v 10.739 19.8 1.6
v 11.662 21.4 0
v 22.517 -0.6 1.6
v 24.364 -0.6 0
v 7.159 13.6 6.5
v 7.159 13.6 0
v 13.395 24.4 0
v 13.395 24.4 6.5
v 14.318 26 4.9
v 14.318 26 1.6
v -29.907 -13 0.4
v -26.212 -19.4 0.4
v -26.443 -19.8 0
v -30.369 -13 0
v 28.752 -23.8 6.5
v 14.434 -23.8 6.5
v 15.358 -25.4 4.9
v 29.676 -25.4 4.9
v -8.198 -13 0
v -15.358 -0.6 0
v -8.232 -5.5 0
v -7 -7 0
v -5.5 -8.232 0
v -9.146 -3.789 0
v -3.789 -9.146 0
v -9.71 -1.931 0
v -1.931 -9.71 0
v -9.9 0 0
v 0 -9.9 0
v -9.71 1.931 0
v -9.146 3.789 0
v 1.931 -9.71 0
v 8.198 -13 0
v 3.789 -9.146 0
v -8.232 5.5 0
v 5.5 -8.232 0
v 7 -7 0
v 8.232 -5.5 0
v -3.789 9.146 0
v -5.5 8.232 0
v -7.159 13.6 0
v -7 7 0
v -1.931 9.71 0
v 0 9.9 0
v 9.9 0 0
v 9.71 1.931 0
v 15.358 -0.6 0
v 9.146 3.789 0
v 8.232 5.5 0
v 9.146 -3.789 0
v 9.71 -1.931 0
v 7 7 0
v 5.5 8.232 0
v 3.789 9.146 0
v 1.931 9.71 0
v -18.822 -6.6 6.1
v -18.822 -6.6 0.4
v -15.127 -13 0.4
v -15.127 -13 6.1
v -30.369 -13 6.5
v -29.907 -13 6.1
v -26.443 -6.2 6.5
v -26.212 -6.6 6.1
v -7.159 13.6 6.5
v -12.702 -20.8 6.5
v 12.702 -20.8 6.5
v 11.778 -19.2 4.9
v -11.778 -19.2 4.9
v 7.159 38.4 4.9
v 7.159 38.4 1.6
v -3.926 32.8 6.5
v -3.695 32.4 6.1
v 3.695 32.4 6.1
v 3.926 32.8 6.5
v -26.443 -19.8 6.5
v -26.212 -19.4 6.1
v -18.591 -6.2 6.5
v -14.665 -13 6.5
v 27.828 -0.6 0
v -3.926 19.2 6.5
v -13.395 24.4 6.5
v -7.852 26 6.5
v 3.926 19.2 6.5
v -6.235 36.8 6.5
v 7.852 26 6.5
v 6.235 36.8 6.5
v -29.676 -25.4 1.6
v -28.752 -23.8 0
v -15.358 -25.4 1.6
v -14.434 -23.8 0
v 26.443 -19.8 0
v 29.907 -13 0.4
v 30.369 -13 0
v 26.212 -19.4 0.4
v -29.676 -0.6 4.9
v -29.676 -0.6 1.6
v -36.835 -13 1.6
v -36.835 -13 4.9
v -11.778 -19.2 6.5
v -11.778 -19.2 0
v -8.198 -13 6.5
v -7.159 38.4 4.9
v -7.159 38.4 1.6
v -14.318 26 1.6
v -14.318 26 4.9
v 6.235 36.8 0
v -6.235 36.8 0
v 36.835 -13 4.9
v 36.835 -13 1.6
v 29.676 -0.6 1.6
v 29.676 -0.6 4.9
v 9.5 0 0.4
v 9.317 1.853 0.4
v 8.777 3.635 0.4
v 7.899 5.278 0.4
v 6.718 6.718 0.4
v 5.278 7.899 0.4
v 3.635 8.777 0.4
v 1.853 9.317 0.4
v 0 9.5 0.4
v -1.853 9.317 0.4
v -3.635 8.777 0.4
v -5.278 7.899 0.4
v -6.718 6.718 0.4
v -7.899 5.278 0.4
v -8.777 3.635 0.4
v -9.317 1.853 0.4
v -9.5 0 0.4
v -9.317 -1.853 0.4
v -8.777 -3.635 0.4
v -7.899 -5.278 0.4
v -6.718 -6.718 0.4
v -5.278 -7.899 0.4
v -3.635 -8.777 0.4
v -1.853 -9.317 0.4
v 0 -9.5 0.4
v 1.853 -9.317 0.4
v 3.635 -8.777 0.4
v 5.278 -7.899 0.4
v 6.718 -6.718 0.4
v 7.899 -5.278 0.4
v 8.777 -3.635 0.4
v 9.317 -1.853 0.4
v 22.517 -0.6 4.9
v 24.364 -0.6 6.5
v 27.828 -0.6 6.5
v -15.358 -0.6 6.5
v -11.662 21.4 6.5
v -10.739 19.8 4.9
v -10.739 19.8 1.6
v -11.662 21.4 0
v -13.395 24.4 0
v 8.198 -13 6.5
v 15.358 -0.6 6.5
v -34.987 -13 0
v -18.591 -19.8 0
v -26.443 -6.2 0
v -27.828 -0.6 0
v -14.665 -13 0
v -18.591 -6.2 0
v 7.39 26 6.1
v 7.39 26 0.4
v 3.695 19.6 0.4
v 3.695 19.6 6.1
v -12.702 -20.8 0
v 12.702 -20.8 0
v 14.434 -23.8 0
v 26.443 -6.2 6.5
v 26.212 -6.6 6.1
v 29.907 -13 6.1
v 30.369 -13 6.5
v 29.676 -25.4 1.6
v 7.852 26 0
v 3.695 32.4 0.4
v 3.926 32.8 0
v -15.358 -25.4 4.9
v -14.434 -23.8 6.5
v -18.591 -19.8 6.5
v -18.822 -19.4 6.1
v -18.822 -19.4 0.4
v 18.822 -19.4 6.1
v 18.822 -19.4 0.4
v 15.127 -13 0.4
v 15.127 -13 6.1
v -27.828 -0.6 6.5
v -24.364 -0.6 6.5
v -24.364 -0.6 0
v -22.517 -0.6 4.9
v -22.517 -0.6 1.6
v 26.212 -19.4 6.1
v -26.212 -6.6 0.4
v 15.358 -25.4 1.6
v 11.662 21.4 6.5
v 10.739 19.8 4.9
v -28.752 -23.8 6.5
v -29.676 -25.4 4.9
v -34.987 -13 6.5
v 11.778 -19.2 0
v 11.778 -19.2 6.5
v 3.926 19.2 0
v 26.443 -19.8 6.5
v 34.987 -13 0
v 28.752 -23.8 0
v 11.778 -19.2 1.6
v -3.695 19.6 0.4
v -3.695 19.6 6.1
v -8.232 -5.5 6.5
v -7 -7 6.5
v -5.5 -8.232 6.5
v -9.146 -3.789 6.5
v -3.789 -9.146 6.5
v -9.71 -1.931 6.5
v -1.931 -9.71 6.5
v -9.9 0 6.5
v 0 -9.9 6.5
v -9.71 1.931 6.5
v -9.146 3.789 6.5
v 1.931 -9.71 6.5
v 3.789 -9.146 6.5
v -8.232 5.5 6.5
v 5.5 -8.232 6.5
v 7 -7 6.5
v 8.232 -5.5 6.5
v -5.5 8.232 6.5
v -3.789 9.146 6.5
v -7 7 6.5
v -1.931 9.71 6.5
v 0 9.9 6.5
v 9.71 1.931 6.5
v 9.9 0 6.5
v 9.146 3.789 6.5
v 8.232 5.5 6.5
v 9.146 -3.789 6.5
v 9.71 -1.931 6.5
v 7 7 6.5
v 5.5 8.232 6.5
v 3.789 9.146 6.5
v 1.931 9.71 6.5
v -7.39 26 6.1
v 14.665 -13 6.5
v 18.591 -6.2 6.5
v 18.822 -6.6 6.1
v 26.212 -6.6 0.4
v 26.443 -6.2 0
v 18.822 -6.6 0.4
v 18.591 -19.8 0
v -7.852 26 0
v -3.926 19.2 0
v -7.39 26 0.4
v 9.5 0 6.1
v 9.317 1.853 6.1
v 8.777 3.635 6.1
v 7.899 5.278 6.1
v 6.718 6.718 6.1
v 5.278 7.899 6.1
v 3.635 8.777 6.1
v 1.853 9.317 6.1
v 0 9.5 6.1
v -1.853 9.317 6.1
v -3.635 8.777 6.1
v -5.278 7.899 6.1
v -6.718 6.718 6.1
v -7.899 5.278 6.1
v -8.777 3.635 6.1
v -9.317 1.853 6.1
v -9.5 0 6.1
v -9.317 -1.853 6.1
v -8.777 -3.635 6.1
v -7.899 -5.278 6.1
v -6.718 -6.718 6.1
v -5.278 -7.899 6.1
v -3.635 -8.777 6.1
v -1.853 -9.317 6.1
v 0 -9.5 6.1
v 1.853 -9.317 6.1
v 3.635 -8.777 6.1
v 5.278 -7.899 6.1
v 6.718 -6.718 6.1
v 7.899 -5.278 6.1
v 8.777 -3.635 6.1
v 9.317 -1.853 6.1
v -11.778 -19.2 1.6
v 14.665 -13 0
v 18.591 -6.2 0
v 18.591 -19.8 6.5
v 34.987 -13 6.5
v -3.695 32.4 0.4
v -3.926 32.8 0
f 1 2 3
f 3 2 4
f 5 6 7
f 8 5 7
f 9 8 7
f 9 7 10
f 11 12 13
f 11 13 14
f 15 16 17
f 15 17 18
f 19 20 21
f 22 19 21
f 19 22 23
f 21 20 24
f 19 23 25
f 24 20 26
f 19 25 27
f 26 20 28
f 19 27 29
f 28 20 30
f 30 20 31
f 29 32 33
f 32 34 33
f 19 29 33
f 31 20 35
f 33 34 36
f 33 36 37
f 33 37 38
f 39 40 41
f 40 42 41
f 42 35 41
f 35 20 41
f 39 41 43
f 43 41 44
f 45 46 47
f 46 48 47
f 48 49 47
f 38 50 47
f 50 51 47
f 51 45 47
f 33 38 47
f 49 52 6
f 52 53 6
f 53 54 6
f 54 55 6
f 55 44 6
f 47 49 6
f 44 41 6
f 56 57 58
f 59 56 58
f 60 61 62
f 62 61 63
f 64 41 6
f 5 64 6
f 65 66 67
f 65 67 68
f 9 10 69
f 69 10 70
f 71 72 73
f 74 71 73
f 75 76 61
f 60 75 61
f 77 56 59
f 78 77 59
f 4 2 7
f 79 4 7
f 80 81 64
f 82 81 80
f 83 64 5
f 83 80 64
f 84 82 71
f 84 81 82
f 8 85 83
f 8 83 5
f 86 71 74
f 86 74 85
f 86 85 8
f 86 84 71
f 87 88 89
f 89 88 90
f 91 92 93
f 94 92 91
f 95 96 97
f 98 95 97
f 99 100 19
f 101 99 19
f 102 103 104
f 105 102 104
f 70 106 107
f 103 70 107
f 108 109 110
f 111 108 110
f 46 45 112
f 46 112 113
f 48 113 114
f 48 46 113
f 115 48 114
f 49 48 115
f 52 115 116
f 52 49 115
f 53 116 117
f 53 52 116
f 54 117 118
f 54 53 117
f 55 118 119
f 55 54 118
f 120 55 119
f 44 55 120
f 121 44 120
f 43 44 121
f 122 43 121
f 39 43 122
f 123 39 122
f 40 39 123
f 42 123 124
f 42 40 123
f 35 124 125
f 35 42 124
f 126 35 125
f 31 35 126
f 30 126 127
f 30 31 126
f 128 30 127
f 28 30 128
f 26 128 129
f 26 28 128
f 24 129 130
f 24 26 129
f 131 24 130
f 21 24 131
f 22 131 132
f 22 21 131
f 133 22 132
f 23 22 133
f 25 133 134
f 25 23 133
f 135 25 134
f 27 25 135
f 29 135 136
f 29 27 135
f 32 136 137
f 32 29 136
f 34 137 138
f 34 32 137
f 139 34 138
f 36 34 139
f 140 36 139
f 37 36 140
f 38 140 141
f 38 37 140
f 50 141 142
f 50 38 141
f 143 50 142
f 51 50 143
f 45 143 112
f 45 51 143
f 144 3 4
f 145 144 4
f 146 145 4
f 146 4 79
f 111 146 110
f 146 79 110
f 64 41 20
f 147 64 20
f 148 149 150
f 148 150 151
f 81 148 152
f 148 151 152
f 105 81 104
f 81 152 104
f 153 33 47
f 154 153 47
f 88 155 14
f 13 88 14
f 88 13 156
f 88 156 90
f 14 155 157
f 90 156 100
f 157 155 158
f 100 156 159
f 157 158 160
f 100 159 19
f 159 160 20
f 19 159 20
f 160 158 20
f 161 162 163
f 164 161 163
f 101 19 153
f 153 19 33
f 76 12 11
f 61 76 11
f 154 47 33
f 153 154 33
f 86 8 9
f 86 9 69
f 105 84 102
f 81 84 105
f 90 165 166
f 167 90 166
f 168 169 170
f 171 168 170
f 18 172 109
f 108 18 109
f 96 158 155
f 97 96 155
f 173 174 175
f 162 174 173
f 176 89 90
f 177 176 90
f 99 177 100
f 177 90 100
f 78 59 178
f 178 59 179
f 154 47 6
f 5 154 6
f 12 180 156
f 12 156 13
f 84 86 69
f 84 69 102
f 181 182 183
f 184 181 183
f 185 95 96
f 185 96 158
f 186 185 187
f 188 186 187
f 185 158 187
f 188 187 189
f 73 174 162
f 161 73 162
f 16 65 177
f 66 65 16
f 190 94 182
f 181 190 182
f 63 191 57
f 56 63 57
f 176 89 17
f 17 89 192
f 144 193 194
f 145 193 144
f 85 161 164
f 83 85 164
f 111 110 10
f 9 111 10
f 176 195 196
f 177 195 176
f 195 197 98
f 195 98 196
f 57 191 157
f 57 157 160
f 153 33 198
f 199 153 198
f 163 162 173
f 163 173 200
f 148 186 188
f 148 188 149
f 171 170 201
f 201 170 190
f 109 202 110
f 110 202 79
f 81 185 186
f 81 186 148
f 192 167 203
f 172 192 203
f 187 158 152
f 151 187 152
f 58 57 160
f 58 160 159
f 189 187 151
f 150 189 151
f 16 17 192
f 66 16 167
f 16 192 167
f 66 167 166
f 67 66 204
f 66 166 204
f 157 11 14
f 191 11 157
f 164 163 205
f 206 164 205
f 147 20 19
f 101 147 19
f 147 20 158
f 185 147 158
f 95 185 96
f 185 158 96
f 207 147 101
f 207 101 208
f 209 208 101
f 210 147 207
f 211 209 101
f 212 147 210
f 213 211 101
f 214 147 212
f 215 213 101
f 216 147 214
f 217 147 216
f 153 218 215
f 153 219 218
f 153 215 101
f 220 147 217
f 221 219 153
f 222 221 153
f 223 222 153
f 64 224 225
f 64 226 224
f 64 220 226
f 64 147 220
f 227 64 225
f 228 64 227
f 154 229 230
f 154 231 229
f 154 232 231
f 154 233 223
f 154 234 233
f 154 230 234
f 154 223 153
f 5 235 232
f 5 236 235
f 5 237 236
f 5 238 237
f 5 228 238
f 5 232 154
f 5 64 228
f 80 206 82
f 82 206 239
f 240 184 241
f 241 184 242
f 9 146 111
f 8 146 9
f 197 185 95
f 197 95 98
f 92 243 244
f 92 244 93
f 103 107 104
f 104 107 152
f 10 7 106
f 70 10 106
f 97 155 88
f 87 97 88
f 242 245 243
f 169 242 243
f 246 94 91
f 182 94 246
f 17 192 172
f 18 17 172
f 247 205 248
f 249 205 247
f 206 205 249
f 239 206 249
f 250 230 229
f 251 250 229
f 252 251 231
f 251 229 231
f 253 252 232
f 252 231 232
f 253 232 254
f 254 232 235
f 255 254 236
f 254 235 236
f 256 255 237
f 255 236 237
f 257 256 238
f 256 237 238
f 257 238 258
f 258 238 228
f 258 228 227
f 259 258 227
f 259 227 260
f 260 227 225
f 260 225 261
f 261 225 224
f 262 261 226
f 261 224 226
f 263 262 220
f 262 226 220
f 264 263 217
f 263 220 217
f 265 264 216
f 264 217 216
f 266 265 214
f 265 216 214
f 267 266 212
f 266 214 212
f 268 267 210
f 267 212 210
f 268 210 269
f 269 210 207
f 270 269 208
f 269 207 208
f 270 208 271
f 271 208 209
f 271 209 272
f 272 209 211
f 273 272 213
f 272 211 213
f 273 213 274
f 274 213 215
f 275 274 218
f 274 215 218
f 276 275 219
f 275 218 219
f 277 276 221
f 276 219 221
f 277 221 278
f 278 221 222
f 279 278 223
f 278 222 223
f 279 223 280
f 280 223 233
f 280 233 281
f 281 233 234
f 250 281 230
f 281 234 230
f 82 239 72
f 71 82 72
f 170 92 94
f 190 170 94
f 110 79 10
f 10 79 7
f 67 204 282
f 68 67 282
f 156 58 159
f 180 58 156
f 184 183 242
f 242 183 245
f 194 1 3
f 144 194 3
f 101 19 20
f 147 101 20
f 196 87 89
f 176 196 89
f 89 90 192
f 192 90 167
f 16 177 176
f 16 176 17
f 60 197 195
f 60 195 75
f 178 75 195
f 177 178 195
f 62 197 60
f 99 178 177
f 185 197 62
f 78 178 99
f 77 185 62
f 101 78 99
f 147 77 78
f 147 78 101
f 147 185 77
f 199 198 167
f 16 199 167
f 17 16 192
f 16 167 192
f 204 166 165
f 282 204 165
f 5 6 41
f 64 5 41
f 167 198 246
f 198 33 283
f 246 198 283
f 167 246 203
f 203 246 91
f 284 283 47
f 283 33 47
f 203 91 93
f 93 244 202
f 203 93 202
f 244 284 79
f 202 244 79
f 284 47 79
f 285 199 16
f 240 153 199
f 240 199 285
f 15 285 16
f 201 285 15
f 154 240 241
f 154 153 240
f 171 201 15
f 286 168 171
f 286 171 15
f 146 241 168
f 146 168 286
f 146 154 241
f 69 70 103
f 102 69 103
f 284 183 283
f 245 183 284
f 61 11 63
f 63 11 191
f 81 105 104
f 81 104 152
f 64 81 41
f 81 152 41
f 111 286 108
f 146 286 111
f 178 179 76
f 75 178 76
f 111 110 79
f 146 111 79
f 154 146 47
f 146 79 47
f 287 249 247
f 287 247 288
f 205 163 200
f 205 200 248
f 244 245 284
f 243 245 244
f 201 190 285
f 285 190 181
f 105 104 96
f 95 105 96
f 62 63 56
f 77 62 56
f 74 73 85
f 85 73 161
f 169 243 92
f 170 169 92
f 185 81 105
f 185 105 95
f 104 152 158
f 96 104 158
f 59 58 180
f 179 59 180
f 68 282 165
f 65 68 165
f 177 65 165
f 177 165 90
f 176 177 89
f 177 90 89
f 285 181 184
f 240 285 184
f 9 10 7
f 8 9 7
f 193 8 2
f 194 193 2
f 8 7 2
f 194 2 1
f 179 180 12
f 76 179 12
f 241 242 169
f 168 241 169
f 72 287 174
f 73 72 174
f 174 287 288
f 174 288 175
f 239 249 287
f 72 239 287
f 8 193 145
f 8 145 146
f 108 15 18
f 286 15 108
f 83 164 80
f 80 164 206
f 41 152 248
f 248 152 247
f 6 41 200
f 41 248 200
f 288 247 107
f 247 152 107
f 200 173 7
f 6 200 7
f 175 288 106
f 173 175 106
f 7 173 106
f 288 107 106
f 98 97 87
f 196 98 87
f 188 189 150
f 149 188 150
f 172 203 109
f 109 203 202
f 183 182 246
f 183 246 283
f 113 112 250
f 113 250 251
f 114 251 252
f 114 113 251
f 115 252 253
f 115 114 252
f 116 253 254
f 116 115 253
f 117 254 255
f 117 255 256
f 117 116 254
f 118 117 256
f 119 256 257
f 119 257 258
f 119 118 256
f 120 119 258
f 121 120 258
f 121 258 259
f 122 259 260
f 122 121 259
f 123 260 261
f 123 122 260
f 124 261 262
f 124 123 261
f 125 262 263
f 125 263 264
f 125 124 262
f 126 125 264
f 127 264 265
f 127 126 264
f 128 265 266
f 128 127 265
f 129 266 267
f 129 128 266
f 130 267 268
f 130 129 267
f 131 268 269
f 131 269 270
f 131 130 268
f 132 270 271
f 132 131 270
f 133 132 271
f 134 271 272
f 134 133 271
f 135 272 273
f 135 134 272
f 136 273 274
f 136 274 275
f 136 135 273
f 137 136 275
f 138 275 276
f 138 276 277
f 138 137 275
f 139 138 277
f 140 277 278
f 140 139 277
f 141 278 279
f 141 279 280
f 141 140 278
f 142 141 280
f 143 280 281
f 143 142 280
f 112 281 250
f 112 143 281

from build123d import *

# Parameters (mm, degrees)
F1_DEPTH  = 6.5
F0_R      = 9.5
F2_DEPTH  = 6.5
F3_SIZE   = 1.6
F4_SIZE   = 1.6
F5_SIZE   = 0.4
F5_2_SIZE = 0.4


with BuildPart() as f1:
    # F0 (on Top) → F1 (new body)
    with BuildSketch(Plane.XY):
        Polygon((-10.738715, 19.8), (-7.159143, 13.6), (7.159143, 13.6), (10.738715, 19.8), (14.318287, 26), (7.159143, 38.4), (-7.159143, 38.4), (-14.318287, 26), align=None)
        Polygon((7.390083, 26), (3.695042, 19.6), (-3.695042, 19.6), (-7.390083, 26), (-3.695042, 32.4), (3.695042, 32.4), align=None, mode=Mode.SUBTRACT)
        Polygon((-8.198374, -13), (-15.357517, -0.6), (-22.51666, -0.6), (-29.675804, -0.6), (-36.834947, -13), (-29.675804, -25.4), (-15.357517, -25.4), (-11.777945, -19.2), align=None)
        Polygon((-18.821619, -19.4), (-26.211702, -19.4), (-29.906744, -13), (-26.211702, -6.6), (-18.821619, -6.6), (-15.126577, -13), align=None, mode=Mode.SUBTRACT)
        Polygon((22.51666, -0.6), (15.357517, -0.6), (8.198374, -13), (11.777945, -19.2), (15.357517, -25.4), (29.675804, -25.4), (36.834947, -13), (29.675804, -0.6), align=None)
        Polygon((26.211702, -6.6), (29.906744, -13), (26.211702, -19.4), (18.821619, -19.4), (15.126577, -13), (18.821619, -6.6), align=None, mode=Mode.SUBTRACT)
    extrude(amount=F1_DEPTH)

    # F4
    f4_edges = [f1.edges().sort_by_distance(p)[0] for p in [
        (-10.738715, 32.2, 6.5),
        (-10.738715, 32.2, 0),
        (-33.255376, -6.8, 6.5),
        (-33.255376, -6.8, 0),
        (10.738715, 32.2, 6.5),
        (10.738715, 32.2, 0),
        (33.255376, -6.8, 6.5),
        (33.255376, -6.8, 0),
        (22.51666, -25.4, 6.5),
        (22.51666, -25.4, 0),
        (-22.51666, -25.4, 6.5),
        (-22.51666, -25.4, 0),
        (33.255376, -19.2, 6.5),
        (33.255376, -19.2, 0),
        (-33.255376, -19.2, 6.5),
        (-33.255376, -19.2, 0),
        (0, 38.4, 6.5),
        (0, 38.4, 0),
    ]]
    chamfer(f4_edges, length=F4_SIZE)

    # F5#2
    f5_2_edges = [f1.edges().sort_by_distance(p)[0] for p in [
        (5.542563, 22.8, 6.5),
        (5.542563, 29.2, 6.5),
        (0, 19.6, 6.5),
        (-5.542563, 22.8, 6.5),
        (-5.542563, 29.2, 6.5),
        (0, 32.4, 6.5),
        (-5.542563, 22.8, 0),
        (0, 19.6, 0),
        (5.542563, 22.8, 0),
        (5.542563, 29.2, 0),
        (0, 32.4, 0),
        (-5.542563, 29.2, 0),
        (-22.51666, -6.6, 0),
        (-28.059223, -9.8, 0),
        (-28.059223, -16.2, 0),
        (-22.51666, -19.4, 0),
        (-16.974098, -16.2, 0),
        (-16.974098, -9.8, 0),
        (-16.974098, -16.2, 6.5),
        (-16.974098, -9.8, 6.5),
        (-22.51666, -6.6, 6.5),
        (-28.059223, -9.8, 6.5),
        (-28.059223, -16.2, 6.5),
        (-22.51666, -19.4, 6.5),
        (22.51666, -19.4, 6.5),
        (28.059223, -16.2, 6.5),
        (28.059223, -9.8, 6.5),
        (22.51666, -6.6, 6.5),
        (16.974098, -9.8, 6.5),
        (16.974098, -16.2, 6.5),
        (22.51666, -19.4, 0),
        (16.974098, -16.2, 0),
        (16.974098, -9.8, 0),
        (22.51666, -6.6, 0),
        (28.059223, -9.8, 0),
        (28.059223, -16.2, 0),
    ]]
    chamfer(f5_2_edges, length=F5_2_SIZE)


with BuildPart() as f2:
    # F0 (on Top) → F2 (new body)
    with BuildSketch(Plane.XY):
        Polygon((-22.51666, -0.6), (-10.738715, 19.8), (-14.318287, 26), (-29.675804, -0.6), align=None)
        Polygon((7.159143, 13.6), (-7.159143, 13.6), (-15.357517, -0.6), (-8.198374, -13), (8.198374, -13), (15.357517, -0.6), align=None)
        Circle(F0_R, mode=Mode.SUBTRACT)
        Polygon((11.777945, -19.2), (-11.777945, -19.2), (-15.357517, -25.4), (15.357517, -25.4), align=None)
        Polygon((14.318287, 26), (10.738715, 19.8), (22.51666, -0.6), (29.675804, -0.6), align=None)
    extrude(amount=F2_DEPTH)

    # F3
    f3_edges = [f2.edges().sort_by_distance(p)[0] for p in [
        (-21.997045, 12.7, 6.5),
        (-21.997045, 12.7, 0),
        (0, -25.4, 6.5),
        (0, -25.4, 0),
        (21.997045, 12.7, 6.5),
        (21.997045, 12.7, 0),
        (16.627688, 9.6, 6.5),
        (0, -19.2, 6.5),
        (-16.627688, 9.6, 0),
        (-16.627688, 9.6, 6.5),
        (16.627688, 9.6, 0),
        (0, -19.2, 0),
    ]]
    chamfer(f3_edges, length=F3_SIZE)

    # F5
    f5_edges = [f2.edges().sort_by_distance(p)[0] for p in [
        (-9.5, 0, 6.5),
        (-9.5, 0, 0),
    ]]
    chamfer(f5_edges, length=F5_SIZE)


solid = Compound([f1.part, f2.part])
